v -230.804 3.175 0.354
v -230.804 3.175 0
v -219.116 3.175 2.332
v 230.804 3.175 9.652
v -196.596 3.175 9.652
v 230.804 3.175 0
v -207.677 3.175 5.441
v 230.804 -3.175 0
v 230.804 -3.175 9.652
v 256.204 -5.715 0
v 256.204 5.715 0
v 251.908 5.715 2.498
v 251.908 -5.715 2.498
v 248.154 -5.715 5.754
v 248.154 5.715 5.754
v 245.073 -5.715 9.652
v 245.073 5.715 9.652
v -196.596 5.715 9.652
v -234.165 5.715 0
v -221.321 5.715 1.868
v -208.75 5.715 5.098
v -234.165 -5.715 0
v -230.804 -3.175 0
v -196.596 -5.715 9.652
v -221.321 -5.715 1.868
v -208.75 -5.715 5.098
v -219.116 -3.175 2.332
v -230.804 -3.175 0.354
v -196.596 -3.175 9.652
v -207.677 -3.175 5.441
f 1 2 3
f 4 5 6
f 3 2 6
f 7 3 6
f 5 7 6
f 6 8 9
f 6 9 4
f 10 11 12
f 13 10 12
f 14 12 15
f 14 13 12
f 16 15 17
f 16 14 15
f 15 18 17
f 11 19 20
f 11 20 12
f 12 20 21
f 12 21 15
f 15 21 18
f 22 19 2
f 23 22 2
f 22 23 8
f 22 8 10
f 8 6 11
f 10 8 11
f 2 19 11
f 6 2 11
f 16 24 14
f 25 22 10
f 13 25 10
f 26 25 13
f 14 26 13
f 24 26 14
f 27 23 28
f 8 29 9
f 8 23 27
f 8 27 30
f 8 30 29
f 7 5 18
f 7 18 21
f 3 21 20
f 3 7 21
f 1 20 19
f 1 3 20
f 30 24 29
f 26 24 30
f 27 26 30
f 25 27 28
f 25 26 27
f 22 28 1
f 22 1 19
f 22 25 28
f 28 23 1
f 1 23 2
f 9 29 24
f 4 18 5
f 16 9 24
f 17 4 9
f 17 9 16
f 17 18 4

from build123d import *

# Parameters (mm, degrees)
SKETCH1_W               = 512.407402158
SKETCH1_H               = 11.43
SKETCH1_W_2             = 461.607402158
SKETCH1_H_2             = 6.35
BOSS_EXTRUDE1_DEPTH     = 9.652
CUT_EXTRUDE1_DEPTH      = 257.640102966
CUT_EXTRUDE1_DEPTH_BACK = 257.640102966
SKETCH2_R               = 121.331498574
SKETCH2_R_2             = 26.533992322


with BuildPart() as part:
    # Sketch1 → Boss-Extrude1 (new body)
    with BuildSketch(Plane.XY):
        Rectangle(SKETCH1_W, SKETCH1_H)
        Rectangle(SKETCH1_W_2, SKETCH1_H_2, mode=Mode.SUBTRACT)
    extrude(amount=BOSS_EXTRUDE1_DEPTH)

    # Sketch2 → Cut-Extrude1 (cut, two sides: drawn at the far end of the back side and taken through both)
    with BuildSketch(Plane(origin=(0, 5.715, 0), x_dir=(1, 0, 0), z_dir=(0, 1, 0)).offset(-CUT_EXTRUDE1_DEPTH_BACK)):
        with Locations((-245.184147657, -120.830054161)):
            Circle(SKETCH2_R)
        with Locations((267.338172934, -24.084772887)):
            Circle(SKETCH2_R_2)
    extrude(amount=CUT_EXTRUDE1_DEPTH + CUT_EXTRUDE1_DEPTH_BACK, mode=Mode.SUBTRACT)


solid = part.part
